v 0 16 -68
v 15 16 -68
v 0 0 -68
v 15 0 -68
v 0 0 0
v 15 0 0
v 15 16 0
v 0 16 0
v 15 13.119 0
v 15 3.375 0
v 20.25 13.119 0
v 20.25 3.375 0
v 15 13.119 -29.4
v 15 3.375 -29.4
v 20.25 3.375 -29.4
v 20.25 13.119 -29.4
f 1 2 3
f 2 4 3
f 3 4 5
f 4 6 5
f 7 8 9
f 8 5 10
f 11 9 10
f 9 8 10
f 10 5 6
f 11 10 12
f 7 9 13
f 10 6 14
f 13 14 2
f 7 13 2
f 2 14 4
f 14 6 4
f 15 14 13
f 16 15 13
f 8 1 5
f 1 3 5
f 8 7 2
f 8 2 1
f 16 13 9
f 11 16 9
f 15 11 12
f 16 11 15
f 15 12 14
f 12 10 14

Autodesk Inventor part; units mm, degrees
ref_plane "YZ Plane" through (0, 0, 0) normal (1, 0, 0) x (0, 1, 0)
ref_plane "XZ Plane" through (0, 0, 0) normal (0, 1, 0) x (-1, 0, 0)
ref_plane "XY Plane" through (0, 0, 0) normal (0, 0, 1) x (1, 0, 0)
sketch "Sketch1" plane through (0, 0, 0) normal (0, 1, 0) x (-1, 0, 0)
  line L0 (0, 0) -> (-15, 0)
  line L1 (-15, 0) -> (-15, -68)
  line L2 (-15, -68) -> (0, -68)
  line L3 (0, -68) -> (0, 0)
  dimension "d0" = 15
  dimension "d1" = 68
extrude "Extrusion1" add sketch "Sketch1" along normal blind 16
sketch "Sketch2" plane through (15, 0, 0) normal (1, 0, 0) x (0, 0, -1)
  line L0 (34.4, 3.375) -> (29.4, 3.375) projected
  line L1 (34.4, 13.119) -> (29.4, 13.119) projected
  line L2 (0, 0) -> (0, 16) projected
  line L3 (29.4, 13.119) -> (0, 13.119)
  line L4 (0, 13.119) -> (0, 3.375)
  line L5 (0, 3.375) -> (29.4, 3.375)
  line L6 (29.4, 3.375) -> (29.4, 13.119)
extrude "Extrusion2" add sketch "Sketch2" along normal up to surface (5.25 mm away)
properties part number "smolLipo"
